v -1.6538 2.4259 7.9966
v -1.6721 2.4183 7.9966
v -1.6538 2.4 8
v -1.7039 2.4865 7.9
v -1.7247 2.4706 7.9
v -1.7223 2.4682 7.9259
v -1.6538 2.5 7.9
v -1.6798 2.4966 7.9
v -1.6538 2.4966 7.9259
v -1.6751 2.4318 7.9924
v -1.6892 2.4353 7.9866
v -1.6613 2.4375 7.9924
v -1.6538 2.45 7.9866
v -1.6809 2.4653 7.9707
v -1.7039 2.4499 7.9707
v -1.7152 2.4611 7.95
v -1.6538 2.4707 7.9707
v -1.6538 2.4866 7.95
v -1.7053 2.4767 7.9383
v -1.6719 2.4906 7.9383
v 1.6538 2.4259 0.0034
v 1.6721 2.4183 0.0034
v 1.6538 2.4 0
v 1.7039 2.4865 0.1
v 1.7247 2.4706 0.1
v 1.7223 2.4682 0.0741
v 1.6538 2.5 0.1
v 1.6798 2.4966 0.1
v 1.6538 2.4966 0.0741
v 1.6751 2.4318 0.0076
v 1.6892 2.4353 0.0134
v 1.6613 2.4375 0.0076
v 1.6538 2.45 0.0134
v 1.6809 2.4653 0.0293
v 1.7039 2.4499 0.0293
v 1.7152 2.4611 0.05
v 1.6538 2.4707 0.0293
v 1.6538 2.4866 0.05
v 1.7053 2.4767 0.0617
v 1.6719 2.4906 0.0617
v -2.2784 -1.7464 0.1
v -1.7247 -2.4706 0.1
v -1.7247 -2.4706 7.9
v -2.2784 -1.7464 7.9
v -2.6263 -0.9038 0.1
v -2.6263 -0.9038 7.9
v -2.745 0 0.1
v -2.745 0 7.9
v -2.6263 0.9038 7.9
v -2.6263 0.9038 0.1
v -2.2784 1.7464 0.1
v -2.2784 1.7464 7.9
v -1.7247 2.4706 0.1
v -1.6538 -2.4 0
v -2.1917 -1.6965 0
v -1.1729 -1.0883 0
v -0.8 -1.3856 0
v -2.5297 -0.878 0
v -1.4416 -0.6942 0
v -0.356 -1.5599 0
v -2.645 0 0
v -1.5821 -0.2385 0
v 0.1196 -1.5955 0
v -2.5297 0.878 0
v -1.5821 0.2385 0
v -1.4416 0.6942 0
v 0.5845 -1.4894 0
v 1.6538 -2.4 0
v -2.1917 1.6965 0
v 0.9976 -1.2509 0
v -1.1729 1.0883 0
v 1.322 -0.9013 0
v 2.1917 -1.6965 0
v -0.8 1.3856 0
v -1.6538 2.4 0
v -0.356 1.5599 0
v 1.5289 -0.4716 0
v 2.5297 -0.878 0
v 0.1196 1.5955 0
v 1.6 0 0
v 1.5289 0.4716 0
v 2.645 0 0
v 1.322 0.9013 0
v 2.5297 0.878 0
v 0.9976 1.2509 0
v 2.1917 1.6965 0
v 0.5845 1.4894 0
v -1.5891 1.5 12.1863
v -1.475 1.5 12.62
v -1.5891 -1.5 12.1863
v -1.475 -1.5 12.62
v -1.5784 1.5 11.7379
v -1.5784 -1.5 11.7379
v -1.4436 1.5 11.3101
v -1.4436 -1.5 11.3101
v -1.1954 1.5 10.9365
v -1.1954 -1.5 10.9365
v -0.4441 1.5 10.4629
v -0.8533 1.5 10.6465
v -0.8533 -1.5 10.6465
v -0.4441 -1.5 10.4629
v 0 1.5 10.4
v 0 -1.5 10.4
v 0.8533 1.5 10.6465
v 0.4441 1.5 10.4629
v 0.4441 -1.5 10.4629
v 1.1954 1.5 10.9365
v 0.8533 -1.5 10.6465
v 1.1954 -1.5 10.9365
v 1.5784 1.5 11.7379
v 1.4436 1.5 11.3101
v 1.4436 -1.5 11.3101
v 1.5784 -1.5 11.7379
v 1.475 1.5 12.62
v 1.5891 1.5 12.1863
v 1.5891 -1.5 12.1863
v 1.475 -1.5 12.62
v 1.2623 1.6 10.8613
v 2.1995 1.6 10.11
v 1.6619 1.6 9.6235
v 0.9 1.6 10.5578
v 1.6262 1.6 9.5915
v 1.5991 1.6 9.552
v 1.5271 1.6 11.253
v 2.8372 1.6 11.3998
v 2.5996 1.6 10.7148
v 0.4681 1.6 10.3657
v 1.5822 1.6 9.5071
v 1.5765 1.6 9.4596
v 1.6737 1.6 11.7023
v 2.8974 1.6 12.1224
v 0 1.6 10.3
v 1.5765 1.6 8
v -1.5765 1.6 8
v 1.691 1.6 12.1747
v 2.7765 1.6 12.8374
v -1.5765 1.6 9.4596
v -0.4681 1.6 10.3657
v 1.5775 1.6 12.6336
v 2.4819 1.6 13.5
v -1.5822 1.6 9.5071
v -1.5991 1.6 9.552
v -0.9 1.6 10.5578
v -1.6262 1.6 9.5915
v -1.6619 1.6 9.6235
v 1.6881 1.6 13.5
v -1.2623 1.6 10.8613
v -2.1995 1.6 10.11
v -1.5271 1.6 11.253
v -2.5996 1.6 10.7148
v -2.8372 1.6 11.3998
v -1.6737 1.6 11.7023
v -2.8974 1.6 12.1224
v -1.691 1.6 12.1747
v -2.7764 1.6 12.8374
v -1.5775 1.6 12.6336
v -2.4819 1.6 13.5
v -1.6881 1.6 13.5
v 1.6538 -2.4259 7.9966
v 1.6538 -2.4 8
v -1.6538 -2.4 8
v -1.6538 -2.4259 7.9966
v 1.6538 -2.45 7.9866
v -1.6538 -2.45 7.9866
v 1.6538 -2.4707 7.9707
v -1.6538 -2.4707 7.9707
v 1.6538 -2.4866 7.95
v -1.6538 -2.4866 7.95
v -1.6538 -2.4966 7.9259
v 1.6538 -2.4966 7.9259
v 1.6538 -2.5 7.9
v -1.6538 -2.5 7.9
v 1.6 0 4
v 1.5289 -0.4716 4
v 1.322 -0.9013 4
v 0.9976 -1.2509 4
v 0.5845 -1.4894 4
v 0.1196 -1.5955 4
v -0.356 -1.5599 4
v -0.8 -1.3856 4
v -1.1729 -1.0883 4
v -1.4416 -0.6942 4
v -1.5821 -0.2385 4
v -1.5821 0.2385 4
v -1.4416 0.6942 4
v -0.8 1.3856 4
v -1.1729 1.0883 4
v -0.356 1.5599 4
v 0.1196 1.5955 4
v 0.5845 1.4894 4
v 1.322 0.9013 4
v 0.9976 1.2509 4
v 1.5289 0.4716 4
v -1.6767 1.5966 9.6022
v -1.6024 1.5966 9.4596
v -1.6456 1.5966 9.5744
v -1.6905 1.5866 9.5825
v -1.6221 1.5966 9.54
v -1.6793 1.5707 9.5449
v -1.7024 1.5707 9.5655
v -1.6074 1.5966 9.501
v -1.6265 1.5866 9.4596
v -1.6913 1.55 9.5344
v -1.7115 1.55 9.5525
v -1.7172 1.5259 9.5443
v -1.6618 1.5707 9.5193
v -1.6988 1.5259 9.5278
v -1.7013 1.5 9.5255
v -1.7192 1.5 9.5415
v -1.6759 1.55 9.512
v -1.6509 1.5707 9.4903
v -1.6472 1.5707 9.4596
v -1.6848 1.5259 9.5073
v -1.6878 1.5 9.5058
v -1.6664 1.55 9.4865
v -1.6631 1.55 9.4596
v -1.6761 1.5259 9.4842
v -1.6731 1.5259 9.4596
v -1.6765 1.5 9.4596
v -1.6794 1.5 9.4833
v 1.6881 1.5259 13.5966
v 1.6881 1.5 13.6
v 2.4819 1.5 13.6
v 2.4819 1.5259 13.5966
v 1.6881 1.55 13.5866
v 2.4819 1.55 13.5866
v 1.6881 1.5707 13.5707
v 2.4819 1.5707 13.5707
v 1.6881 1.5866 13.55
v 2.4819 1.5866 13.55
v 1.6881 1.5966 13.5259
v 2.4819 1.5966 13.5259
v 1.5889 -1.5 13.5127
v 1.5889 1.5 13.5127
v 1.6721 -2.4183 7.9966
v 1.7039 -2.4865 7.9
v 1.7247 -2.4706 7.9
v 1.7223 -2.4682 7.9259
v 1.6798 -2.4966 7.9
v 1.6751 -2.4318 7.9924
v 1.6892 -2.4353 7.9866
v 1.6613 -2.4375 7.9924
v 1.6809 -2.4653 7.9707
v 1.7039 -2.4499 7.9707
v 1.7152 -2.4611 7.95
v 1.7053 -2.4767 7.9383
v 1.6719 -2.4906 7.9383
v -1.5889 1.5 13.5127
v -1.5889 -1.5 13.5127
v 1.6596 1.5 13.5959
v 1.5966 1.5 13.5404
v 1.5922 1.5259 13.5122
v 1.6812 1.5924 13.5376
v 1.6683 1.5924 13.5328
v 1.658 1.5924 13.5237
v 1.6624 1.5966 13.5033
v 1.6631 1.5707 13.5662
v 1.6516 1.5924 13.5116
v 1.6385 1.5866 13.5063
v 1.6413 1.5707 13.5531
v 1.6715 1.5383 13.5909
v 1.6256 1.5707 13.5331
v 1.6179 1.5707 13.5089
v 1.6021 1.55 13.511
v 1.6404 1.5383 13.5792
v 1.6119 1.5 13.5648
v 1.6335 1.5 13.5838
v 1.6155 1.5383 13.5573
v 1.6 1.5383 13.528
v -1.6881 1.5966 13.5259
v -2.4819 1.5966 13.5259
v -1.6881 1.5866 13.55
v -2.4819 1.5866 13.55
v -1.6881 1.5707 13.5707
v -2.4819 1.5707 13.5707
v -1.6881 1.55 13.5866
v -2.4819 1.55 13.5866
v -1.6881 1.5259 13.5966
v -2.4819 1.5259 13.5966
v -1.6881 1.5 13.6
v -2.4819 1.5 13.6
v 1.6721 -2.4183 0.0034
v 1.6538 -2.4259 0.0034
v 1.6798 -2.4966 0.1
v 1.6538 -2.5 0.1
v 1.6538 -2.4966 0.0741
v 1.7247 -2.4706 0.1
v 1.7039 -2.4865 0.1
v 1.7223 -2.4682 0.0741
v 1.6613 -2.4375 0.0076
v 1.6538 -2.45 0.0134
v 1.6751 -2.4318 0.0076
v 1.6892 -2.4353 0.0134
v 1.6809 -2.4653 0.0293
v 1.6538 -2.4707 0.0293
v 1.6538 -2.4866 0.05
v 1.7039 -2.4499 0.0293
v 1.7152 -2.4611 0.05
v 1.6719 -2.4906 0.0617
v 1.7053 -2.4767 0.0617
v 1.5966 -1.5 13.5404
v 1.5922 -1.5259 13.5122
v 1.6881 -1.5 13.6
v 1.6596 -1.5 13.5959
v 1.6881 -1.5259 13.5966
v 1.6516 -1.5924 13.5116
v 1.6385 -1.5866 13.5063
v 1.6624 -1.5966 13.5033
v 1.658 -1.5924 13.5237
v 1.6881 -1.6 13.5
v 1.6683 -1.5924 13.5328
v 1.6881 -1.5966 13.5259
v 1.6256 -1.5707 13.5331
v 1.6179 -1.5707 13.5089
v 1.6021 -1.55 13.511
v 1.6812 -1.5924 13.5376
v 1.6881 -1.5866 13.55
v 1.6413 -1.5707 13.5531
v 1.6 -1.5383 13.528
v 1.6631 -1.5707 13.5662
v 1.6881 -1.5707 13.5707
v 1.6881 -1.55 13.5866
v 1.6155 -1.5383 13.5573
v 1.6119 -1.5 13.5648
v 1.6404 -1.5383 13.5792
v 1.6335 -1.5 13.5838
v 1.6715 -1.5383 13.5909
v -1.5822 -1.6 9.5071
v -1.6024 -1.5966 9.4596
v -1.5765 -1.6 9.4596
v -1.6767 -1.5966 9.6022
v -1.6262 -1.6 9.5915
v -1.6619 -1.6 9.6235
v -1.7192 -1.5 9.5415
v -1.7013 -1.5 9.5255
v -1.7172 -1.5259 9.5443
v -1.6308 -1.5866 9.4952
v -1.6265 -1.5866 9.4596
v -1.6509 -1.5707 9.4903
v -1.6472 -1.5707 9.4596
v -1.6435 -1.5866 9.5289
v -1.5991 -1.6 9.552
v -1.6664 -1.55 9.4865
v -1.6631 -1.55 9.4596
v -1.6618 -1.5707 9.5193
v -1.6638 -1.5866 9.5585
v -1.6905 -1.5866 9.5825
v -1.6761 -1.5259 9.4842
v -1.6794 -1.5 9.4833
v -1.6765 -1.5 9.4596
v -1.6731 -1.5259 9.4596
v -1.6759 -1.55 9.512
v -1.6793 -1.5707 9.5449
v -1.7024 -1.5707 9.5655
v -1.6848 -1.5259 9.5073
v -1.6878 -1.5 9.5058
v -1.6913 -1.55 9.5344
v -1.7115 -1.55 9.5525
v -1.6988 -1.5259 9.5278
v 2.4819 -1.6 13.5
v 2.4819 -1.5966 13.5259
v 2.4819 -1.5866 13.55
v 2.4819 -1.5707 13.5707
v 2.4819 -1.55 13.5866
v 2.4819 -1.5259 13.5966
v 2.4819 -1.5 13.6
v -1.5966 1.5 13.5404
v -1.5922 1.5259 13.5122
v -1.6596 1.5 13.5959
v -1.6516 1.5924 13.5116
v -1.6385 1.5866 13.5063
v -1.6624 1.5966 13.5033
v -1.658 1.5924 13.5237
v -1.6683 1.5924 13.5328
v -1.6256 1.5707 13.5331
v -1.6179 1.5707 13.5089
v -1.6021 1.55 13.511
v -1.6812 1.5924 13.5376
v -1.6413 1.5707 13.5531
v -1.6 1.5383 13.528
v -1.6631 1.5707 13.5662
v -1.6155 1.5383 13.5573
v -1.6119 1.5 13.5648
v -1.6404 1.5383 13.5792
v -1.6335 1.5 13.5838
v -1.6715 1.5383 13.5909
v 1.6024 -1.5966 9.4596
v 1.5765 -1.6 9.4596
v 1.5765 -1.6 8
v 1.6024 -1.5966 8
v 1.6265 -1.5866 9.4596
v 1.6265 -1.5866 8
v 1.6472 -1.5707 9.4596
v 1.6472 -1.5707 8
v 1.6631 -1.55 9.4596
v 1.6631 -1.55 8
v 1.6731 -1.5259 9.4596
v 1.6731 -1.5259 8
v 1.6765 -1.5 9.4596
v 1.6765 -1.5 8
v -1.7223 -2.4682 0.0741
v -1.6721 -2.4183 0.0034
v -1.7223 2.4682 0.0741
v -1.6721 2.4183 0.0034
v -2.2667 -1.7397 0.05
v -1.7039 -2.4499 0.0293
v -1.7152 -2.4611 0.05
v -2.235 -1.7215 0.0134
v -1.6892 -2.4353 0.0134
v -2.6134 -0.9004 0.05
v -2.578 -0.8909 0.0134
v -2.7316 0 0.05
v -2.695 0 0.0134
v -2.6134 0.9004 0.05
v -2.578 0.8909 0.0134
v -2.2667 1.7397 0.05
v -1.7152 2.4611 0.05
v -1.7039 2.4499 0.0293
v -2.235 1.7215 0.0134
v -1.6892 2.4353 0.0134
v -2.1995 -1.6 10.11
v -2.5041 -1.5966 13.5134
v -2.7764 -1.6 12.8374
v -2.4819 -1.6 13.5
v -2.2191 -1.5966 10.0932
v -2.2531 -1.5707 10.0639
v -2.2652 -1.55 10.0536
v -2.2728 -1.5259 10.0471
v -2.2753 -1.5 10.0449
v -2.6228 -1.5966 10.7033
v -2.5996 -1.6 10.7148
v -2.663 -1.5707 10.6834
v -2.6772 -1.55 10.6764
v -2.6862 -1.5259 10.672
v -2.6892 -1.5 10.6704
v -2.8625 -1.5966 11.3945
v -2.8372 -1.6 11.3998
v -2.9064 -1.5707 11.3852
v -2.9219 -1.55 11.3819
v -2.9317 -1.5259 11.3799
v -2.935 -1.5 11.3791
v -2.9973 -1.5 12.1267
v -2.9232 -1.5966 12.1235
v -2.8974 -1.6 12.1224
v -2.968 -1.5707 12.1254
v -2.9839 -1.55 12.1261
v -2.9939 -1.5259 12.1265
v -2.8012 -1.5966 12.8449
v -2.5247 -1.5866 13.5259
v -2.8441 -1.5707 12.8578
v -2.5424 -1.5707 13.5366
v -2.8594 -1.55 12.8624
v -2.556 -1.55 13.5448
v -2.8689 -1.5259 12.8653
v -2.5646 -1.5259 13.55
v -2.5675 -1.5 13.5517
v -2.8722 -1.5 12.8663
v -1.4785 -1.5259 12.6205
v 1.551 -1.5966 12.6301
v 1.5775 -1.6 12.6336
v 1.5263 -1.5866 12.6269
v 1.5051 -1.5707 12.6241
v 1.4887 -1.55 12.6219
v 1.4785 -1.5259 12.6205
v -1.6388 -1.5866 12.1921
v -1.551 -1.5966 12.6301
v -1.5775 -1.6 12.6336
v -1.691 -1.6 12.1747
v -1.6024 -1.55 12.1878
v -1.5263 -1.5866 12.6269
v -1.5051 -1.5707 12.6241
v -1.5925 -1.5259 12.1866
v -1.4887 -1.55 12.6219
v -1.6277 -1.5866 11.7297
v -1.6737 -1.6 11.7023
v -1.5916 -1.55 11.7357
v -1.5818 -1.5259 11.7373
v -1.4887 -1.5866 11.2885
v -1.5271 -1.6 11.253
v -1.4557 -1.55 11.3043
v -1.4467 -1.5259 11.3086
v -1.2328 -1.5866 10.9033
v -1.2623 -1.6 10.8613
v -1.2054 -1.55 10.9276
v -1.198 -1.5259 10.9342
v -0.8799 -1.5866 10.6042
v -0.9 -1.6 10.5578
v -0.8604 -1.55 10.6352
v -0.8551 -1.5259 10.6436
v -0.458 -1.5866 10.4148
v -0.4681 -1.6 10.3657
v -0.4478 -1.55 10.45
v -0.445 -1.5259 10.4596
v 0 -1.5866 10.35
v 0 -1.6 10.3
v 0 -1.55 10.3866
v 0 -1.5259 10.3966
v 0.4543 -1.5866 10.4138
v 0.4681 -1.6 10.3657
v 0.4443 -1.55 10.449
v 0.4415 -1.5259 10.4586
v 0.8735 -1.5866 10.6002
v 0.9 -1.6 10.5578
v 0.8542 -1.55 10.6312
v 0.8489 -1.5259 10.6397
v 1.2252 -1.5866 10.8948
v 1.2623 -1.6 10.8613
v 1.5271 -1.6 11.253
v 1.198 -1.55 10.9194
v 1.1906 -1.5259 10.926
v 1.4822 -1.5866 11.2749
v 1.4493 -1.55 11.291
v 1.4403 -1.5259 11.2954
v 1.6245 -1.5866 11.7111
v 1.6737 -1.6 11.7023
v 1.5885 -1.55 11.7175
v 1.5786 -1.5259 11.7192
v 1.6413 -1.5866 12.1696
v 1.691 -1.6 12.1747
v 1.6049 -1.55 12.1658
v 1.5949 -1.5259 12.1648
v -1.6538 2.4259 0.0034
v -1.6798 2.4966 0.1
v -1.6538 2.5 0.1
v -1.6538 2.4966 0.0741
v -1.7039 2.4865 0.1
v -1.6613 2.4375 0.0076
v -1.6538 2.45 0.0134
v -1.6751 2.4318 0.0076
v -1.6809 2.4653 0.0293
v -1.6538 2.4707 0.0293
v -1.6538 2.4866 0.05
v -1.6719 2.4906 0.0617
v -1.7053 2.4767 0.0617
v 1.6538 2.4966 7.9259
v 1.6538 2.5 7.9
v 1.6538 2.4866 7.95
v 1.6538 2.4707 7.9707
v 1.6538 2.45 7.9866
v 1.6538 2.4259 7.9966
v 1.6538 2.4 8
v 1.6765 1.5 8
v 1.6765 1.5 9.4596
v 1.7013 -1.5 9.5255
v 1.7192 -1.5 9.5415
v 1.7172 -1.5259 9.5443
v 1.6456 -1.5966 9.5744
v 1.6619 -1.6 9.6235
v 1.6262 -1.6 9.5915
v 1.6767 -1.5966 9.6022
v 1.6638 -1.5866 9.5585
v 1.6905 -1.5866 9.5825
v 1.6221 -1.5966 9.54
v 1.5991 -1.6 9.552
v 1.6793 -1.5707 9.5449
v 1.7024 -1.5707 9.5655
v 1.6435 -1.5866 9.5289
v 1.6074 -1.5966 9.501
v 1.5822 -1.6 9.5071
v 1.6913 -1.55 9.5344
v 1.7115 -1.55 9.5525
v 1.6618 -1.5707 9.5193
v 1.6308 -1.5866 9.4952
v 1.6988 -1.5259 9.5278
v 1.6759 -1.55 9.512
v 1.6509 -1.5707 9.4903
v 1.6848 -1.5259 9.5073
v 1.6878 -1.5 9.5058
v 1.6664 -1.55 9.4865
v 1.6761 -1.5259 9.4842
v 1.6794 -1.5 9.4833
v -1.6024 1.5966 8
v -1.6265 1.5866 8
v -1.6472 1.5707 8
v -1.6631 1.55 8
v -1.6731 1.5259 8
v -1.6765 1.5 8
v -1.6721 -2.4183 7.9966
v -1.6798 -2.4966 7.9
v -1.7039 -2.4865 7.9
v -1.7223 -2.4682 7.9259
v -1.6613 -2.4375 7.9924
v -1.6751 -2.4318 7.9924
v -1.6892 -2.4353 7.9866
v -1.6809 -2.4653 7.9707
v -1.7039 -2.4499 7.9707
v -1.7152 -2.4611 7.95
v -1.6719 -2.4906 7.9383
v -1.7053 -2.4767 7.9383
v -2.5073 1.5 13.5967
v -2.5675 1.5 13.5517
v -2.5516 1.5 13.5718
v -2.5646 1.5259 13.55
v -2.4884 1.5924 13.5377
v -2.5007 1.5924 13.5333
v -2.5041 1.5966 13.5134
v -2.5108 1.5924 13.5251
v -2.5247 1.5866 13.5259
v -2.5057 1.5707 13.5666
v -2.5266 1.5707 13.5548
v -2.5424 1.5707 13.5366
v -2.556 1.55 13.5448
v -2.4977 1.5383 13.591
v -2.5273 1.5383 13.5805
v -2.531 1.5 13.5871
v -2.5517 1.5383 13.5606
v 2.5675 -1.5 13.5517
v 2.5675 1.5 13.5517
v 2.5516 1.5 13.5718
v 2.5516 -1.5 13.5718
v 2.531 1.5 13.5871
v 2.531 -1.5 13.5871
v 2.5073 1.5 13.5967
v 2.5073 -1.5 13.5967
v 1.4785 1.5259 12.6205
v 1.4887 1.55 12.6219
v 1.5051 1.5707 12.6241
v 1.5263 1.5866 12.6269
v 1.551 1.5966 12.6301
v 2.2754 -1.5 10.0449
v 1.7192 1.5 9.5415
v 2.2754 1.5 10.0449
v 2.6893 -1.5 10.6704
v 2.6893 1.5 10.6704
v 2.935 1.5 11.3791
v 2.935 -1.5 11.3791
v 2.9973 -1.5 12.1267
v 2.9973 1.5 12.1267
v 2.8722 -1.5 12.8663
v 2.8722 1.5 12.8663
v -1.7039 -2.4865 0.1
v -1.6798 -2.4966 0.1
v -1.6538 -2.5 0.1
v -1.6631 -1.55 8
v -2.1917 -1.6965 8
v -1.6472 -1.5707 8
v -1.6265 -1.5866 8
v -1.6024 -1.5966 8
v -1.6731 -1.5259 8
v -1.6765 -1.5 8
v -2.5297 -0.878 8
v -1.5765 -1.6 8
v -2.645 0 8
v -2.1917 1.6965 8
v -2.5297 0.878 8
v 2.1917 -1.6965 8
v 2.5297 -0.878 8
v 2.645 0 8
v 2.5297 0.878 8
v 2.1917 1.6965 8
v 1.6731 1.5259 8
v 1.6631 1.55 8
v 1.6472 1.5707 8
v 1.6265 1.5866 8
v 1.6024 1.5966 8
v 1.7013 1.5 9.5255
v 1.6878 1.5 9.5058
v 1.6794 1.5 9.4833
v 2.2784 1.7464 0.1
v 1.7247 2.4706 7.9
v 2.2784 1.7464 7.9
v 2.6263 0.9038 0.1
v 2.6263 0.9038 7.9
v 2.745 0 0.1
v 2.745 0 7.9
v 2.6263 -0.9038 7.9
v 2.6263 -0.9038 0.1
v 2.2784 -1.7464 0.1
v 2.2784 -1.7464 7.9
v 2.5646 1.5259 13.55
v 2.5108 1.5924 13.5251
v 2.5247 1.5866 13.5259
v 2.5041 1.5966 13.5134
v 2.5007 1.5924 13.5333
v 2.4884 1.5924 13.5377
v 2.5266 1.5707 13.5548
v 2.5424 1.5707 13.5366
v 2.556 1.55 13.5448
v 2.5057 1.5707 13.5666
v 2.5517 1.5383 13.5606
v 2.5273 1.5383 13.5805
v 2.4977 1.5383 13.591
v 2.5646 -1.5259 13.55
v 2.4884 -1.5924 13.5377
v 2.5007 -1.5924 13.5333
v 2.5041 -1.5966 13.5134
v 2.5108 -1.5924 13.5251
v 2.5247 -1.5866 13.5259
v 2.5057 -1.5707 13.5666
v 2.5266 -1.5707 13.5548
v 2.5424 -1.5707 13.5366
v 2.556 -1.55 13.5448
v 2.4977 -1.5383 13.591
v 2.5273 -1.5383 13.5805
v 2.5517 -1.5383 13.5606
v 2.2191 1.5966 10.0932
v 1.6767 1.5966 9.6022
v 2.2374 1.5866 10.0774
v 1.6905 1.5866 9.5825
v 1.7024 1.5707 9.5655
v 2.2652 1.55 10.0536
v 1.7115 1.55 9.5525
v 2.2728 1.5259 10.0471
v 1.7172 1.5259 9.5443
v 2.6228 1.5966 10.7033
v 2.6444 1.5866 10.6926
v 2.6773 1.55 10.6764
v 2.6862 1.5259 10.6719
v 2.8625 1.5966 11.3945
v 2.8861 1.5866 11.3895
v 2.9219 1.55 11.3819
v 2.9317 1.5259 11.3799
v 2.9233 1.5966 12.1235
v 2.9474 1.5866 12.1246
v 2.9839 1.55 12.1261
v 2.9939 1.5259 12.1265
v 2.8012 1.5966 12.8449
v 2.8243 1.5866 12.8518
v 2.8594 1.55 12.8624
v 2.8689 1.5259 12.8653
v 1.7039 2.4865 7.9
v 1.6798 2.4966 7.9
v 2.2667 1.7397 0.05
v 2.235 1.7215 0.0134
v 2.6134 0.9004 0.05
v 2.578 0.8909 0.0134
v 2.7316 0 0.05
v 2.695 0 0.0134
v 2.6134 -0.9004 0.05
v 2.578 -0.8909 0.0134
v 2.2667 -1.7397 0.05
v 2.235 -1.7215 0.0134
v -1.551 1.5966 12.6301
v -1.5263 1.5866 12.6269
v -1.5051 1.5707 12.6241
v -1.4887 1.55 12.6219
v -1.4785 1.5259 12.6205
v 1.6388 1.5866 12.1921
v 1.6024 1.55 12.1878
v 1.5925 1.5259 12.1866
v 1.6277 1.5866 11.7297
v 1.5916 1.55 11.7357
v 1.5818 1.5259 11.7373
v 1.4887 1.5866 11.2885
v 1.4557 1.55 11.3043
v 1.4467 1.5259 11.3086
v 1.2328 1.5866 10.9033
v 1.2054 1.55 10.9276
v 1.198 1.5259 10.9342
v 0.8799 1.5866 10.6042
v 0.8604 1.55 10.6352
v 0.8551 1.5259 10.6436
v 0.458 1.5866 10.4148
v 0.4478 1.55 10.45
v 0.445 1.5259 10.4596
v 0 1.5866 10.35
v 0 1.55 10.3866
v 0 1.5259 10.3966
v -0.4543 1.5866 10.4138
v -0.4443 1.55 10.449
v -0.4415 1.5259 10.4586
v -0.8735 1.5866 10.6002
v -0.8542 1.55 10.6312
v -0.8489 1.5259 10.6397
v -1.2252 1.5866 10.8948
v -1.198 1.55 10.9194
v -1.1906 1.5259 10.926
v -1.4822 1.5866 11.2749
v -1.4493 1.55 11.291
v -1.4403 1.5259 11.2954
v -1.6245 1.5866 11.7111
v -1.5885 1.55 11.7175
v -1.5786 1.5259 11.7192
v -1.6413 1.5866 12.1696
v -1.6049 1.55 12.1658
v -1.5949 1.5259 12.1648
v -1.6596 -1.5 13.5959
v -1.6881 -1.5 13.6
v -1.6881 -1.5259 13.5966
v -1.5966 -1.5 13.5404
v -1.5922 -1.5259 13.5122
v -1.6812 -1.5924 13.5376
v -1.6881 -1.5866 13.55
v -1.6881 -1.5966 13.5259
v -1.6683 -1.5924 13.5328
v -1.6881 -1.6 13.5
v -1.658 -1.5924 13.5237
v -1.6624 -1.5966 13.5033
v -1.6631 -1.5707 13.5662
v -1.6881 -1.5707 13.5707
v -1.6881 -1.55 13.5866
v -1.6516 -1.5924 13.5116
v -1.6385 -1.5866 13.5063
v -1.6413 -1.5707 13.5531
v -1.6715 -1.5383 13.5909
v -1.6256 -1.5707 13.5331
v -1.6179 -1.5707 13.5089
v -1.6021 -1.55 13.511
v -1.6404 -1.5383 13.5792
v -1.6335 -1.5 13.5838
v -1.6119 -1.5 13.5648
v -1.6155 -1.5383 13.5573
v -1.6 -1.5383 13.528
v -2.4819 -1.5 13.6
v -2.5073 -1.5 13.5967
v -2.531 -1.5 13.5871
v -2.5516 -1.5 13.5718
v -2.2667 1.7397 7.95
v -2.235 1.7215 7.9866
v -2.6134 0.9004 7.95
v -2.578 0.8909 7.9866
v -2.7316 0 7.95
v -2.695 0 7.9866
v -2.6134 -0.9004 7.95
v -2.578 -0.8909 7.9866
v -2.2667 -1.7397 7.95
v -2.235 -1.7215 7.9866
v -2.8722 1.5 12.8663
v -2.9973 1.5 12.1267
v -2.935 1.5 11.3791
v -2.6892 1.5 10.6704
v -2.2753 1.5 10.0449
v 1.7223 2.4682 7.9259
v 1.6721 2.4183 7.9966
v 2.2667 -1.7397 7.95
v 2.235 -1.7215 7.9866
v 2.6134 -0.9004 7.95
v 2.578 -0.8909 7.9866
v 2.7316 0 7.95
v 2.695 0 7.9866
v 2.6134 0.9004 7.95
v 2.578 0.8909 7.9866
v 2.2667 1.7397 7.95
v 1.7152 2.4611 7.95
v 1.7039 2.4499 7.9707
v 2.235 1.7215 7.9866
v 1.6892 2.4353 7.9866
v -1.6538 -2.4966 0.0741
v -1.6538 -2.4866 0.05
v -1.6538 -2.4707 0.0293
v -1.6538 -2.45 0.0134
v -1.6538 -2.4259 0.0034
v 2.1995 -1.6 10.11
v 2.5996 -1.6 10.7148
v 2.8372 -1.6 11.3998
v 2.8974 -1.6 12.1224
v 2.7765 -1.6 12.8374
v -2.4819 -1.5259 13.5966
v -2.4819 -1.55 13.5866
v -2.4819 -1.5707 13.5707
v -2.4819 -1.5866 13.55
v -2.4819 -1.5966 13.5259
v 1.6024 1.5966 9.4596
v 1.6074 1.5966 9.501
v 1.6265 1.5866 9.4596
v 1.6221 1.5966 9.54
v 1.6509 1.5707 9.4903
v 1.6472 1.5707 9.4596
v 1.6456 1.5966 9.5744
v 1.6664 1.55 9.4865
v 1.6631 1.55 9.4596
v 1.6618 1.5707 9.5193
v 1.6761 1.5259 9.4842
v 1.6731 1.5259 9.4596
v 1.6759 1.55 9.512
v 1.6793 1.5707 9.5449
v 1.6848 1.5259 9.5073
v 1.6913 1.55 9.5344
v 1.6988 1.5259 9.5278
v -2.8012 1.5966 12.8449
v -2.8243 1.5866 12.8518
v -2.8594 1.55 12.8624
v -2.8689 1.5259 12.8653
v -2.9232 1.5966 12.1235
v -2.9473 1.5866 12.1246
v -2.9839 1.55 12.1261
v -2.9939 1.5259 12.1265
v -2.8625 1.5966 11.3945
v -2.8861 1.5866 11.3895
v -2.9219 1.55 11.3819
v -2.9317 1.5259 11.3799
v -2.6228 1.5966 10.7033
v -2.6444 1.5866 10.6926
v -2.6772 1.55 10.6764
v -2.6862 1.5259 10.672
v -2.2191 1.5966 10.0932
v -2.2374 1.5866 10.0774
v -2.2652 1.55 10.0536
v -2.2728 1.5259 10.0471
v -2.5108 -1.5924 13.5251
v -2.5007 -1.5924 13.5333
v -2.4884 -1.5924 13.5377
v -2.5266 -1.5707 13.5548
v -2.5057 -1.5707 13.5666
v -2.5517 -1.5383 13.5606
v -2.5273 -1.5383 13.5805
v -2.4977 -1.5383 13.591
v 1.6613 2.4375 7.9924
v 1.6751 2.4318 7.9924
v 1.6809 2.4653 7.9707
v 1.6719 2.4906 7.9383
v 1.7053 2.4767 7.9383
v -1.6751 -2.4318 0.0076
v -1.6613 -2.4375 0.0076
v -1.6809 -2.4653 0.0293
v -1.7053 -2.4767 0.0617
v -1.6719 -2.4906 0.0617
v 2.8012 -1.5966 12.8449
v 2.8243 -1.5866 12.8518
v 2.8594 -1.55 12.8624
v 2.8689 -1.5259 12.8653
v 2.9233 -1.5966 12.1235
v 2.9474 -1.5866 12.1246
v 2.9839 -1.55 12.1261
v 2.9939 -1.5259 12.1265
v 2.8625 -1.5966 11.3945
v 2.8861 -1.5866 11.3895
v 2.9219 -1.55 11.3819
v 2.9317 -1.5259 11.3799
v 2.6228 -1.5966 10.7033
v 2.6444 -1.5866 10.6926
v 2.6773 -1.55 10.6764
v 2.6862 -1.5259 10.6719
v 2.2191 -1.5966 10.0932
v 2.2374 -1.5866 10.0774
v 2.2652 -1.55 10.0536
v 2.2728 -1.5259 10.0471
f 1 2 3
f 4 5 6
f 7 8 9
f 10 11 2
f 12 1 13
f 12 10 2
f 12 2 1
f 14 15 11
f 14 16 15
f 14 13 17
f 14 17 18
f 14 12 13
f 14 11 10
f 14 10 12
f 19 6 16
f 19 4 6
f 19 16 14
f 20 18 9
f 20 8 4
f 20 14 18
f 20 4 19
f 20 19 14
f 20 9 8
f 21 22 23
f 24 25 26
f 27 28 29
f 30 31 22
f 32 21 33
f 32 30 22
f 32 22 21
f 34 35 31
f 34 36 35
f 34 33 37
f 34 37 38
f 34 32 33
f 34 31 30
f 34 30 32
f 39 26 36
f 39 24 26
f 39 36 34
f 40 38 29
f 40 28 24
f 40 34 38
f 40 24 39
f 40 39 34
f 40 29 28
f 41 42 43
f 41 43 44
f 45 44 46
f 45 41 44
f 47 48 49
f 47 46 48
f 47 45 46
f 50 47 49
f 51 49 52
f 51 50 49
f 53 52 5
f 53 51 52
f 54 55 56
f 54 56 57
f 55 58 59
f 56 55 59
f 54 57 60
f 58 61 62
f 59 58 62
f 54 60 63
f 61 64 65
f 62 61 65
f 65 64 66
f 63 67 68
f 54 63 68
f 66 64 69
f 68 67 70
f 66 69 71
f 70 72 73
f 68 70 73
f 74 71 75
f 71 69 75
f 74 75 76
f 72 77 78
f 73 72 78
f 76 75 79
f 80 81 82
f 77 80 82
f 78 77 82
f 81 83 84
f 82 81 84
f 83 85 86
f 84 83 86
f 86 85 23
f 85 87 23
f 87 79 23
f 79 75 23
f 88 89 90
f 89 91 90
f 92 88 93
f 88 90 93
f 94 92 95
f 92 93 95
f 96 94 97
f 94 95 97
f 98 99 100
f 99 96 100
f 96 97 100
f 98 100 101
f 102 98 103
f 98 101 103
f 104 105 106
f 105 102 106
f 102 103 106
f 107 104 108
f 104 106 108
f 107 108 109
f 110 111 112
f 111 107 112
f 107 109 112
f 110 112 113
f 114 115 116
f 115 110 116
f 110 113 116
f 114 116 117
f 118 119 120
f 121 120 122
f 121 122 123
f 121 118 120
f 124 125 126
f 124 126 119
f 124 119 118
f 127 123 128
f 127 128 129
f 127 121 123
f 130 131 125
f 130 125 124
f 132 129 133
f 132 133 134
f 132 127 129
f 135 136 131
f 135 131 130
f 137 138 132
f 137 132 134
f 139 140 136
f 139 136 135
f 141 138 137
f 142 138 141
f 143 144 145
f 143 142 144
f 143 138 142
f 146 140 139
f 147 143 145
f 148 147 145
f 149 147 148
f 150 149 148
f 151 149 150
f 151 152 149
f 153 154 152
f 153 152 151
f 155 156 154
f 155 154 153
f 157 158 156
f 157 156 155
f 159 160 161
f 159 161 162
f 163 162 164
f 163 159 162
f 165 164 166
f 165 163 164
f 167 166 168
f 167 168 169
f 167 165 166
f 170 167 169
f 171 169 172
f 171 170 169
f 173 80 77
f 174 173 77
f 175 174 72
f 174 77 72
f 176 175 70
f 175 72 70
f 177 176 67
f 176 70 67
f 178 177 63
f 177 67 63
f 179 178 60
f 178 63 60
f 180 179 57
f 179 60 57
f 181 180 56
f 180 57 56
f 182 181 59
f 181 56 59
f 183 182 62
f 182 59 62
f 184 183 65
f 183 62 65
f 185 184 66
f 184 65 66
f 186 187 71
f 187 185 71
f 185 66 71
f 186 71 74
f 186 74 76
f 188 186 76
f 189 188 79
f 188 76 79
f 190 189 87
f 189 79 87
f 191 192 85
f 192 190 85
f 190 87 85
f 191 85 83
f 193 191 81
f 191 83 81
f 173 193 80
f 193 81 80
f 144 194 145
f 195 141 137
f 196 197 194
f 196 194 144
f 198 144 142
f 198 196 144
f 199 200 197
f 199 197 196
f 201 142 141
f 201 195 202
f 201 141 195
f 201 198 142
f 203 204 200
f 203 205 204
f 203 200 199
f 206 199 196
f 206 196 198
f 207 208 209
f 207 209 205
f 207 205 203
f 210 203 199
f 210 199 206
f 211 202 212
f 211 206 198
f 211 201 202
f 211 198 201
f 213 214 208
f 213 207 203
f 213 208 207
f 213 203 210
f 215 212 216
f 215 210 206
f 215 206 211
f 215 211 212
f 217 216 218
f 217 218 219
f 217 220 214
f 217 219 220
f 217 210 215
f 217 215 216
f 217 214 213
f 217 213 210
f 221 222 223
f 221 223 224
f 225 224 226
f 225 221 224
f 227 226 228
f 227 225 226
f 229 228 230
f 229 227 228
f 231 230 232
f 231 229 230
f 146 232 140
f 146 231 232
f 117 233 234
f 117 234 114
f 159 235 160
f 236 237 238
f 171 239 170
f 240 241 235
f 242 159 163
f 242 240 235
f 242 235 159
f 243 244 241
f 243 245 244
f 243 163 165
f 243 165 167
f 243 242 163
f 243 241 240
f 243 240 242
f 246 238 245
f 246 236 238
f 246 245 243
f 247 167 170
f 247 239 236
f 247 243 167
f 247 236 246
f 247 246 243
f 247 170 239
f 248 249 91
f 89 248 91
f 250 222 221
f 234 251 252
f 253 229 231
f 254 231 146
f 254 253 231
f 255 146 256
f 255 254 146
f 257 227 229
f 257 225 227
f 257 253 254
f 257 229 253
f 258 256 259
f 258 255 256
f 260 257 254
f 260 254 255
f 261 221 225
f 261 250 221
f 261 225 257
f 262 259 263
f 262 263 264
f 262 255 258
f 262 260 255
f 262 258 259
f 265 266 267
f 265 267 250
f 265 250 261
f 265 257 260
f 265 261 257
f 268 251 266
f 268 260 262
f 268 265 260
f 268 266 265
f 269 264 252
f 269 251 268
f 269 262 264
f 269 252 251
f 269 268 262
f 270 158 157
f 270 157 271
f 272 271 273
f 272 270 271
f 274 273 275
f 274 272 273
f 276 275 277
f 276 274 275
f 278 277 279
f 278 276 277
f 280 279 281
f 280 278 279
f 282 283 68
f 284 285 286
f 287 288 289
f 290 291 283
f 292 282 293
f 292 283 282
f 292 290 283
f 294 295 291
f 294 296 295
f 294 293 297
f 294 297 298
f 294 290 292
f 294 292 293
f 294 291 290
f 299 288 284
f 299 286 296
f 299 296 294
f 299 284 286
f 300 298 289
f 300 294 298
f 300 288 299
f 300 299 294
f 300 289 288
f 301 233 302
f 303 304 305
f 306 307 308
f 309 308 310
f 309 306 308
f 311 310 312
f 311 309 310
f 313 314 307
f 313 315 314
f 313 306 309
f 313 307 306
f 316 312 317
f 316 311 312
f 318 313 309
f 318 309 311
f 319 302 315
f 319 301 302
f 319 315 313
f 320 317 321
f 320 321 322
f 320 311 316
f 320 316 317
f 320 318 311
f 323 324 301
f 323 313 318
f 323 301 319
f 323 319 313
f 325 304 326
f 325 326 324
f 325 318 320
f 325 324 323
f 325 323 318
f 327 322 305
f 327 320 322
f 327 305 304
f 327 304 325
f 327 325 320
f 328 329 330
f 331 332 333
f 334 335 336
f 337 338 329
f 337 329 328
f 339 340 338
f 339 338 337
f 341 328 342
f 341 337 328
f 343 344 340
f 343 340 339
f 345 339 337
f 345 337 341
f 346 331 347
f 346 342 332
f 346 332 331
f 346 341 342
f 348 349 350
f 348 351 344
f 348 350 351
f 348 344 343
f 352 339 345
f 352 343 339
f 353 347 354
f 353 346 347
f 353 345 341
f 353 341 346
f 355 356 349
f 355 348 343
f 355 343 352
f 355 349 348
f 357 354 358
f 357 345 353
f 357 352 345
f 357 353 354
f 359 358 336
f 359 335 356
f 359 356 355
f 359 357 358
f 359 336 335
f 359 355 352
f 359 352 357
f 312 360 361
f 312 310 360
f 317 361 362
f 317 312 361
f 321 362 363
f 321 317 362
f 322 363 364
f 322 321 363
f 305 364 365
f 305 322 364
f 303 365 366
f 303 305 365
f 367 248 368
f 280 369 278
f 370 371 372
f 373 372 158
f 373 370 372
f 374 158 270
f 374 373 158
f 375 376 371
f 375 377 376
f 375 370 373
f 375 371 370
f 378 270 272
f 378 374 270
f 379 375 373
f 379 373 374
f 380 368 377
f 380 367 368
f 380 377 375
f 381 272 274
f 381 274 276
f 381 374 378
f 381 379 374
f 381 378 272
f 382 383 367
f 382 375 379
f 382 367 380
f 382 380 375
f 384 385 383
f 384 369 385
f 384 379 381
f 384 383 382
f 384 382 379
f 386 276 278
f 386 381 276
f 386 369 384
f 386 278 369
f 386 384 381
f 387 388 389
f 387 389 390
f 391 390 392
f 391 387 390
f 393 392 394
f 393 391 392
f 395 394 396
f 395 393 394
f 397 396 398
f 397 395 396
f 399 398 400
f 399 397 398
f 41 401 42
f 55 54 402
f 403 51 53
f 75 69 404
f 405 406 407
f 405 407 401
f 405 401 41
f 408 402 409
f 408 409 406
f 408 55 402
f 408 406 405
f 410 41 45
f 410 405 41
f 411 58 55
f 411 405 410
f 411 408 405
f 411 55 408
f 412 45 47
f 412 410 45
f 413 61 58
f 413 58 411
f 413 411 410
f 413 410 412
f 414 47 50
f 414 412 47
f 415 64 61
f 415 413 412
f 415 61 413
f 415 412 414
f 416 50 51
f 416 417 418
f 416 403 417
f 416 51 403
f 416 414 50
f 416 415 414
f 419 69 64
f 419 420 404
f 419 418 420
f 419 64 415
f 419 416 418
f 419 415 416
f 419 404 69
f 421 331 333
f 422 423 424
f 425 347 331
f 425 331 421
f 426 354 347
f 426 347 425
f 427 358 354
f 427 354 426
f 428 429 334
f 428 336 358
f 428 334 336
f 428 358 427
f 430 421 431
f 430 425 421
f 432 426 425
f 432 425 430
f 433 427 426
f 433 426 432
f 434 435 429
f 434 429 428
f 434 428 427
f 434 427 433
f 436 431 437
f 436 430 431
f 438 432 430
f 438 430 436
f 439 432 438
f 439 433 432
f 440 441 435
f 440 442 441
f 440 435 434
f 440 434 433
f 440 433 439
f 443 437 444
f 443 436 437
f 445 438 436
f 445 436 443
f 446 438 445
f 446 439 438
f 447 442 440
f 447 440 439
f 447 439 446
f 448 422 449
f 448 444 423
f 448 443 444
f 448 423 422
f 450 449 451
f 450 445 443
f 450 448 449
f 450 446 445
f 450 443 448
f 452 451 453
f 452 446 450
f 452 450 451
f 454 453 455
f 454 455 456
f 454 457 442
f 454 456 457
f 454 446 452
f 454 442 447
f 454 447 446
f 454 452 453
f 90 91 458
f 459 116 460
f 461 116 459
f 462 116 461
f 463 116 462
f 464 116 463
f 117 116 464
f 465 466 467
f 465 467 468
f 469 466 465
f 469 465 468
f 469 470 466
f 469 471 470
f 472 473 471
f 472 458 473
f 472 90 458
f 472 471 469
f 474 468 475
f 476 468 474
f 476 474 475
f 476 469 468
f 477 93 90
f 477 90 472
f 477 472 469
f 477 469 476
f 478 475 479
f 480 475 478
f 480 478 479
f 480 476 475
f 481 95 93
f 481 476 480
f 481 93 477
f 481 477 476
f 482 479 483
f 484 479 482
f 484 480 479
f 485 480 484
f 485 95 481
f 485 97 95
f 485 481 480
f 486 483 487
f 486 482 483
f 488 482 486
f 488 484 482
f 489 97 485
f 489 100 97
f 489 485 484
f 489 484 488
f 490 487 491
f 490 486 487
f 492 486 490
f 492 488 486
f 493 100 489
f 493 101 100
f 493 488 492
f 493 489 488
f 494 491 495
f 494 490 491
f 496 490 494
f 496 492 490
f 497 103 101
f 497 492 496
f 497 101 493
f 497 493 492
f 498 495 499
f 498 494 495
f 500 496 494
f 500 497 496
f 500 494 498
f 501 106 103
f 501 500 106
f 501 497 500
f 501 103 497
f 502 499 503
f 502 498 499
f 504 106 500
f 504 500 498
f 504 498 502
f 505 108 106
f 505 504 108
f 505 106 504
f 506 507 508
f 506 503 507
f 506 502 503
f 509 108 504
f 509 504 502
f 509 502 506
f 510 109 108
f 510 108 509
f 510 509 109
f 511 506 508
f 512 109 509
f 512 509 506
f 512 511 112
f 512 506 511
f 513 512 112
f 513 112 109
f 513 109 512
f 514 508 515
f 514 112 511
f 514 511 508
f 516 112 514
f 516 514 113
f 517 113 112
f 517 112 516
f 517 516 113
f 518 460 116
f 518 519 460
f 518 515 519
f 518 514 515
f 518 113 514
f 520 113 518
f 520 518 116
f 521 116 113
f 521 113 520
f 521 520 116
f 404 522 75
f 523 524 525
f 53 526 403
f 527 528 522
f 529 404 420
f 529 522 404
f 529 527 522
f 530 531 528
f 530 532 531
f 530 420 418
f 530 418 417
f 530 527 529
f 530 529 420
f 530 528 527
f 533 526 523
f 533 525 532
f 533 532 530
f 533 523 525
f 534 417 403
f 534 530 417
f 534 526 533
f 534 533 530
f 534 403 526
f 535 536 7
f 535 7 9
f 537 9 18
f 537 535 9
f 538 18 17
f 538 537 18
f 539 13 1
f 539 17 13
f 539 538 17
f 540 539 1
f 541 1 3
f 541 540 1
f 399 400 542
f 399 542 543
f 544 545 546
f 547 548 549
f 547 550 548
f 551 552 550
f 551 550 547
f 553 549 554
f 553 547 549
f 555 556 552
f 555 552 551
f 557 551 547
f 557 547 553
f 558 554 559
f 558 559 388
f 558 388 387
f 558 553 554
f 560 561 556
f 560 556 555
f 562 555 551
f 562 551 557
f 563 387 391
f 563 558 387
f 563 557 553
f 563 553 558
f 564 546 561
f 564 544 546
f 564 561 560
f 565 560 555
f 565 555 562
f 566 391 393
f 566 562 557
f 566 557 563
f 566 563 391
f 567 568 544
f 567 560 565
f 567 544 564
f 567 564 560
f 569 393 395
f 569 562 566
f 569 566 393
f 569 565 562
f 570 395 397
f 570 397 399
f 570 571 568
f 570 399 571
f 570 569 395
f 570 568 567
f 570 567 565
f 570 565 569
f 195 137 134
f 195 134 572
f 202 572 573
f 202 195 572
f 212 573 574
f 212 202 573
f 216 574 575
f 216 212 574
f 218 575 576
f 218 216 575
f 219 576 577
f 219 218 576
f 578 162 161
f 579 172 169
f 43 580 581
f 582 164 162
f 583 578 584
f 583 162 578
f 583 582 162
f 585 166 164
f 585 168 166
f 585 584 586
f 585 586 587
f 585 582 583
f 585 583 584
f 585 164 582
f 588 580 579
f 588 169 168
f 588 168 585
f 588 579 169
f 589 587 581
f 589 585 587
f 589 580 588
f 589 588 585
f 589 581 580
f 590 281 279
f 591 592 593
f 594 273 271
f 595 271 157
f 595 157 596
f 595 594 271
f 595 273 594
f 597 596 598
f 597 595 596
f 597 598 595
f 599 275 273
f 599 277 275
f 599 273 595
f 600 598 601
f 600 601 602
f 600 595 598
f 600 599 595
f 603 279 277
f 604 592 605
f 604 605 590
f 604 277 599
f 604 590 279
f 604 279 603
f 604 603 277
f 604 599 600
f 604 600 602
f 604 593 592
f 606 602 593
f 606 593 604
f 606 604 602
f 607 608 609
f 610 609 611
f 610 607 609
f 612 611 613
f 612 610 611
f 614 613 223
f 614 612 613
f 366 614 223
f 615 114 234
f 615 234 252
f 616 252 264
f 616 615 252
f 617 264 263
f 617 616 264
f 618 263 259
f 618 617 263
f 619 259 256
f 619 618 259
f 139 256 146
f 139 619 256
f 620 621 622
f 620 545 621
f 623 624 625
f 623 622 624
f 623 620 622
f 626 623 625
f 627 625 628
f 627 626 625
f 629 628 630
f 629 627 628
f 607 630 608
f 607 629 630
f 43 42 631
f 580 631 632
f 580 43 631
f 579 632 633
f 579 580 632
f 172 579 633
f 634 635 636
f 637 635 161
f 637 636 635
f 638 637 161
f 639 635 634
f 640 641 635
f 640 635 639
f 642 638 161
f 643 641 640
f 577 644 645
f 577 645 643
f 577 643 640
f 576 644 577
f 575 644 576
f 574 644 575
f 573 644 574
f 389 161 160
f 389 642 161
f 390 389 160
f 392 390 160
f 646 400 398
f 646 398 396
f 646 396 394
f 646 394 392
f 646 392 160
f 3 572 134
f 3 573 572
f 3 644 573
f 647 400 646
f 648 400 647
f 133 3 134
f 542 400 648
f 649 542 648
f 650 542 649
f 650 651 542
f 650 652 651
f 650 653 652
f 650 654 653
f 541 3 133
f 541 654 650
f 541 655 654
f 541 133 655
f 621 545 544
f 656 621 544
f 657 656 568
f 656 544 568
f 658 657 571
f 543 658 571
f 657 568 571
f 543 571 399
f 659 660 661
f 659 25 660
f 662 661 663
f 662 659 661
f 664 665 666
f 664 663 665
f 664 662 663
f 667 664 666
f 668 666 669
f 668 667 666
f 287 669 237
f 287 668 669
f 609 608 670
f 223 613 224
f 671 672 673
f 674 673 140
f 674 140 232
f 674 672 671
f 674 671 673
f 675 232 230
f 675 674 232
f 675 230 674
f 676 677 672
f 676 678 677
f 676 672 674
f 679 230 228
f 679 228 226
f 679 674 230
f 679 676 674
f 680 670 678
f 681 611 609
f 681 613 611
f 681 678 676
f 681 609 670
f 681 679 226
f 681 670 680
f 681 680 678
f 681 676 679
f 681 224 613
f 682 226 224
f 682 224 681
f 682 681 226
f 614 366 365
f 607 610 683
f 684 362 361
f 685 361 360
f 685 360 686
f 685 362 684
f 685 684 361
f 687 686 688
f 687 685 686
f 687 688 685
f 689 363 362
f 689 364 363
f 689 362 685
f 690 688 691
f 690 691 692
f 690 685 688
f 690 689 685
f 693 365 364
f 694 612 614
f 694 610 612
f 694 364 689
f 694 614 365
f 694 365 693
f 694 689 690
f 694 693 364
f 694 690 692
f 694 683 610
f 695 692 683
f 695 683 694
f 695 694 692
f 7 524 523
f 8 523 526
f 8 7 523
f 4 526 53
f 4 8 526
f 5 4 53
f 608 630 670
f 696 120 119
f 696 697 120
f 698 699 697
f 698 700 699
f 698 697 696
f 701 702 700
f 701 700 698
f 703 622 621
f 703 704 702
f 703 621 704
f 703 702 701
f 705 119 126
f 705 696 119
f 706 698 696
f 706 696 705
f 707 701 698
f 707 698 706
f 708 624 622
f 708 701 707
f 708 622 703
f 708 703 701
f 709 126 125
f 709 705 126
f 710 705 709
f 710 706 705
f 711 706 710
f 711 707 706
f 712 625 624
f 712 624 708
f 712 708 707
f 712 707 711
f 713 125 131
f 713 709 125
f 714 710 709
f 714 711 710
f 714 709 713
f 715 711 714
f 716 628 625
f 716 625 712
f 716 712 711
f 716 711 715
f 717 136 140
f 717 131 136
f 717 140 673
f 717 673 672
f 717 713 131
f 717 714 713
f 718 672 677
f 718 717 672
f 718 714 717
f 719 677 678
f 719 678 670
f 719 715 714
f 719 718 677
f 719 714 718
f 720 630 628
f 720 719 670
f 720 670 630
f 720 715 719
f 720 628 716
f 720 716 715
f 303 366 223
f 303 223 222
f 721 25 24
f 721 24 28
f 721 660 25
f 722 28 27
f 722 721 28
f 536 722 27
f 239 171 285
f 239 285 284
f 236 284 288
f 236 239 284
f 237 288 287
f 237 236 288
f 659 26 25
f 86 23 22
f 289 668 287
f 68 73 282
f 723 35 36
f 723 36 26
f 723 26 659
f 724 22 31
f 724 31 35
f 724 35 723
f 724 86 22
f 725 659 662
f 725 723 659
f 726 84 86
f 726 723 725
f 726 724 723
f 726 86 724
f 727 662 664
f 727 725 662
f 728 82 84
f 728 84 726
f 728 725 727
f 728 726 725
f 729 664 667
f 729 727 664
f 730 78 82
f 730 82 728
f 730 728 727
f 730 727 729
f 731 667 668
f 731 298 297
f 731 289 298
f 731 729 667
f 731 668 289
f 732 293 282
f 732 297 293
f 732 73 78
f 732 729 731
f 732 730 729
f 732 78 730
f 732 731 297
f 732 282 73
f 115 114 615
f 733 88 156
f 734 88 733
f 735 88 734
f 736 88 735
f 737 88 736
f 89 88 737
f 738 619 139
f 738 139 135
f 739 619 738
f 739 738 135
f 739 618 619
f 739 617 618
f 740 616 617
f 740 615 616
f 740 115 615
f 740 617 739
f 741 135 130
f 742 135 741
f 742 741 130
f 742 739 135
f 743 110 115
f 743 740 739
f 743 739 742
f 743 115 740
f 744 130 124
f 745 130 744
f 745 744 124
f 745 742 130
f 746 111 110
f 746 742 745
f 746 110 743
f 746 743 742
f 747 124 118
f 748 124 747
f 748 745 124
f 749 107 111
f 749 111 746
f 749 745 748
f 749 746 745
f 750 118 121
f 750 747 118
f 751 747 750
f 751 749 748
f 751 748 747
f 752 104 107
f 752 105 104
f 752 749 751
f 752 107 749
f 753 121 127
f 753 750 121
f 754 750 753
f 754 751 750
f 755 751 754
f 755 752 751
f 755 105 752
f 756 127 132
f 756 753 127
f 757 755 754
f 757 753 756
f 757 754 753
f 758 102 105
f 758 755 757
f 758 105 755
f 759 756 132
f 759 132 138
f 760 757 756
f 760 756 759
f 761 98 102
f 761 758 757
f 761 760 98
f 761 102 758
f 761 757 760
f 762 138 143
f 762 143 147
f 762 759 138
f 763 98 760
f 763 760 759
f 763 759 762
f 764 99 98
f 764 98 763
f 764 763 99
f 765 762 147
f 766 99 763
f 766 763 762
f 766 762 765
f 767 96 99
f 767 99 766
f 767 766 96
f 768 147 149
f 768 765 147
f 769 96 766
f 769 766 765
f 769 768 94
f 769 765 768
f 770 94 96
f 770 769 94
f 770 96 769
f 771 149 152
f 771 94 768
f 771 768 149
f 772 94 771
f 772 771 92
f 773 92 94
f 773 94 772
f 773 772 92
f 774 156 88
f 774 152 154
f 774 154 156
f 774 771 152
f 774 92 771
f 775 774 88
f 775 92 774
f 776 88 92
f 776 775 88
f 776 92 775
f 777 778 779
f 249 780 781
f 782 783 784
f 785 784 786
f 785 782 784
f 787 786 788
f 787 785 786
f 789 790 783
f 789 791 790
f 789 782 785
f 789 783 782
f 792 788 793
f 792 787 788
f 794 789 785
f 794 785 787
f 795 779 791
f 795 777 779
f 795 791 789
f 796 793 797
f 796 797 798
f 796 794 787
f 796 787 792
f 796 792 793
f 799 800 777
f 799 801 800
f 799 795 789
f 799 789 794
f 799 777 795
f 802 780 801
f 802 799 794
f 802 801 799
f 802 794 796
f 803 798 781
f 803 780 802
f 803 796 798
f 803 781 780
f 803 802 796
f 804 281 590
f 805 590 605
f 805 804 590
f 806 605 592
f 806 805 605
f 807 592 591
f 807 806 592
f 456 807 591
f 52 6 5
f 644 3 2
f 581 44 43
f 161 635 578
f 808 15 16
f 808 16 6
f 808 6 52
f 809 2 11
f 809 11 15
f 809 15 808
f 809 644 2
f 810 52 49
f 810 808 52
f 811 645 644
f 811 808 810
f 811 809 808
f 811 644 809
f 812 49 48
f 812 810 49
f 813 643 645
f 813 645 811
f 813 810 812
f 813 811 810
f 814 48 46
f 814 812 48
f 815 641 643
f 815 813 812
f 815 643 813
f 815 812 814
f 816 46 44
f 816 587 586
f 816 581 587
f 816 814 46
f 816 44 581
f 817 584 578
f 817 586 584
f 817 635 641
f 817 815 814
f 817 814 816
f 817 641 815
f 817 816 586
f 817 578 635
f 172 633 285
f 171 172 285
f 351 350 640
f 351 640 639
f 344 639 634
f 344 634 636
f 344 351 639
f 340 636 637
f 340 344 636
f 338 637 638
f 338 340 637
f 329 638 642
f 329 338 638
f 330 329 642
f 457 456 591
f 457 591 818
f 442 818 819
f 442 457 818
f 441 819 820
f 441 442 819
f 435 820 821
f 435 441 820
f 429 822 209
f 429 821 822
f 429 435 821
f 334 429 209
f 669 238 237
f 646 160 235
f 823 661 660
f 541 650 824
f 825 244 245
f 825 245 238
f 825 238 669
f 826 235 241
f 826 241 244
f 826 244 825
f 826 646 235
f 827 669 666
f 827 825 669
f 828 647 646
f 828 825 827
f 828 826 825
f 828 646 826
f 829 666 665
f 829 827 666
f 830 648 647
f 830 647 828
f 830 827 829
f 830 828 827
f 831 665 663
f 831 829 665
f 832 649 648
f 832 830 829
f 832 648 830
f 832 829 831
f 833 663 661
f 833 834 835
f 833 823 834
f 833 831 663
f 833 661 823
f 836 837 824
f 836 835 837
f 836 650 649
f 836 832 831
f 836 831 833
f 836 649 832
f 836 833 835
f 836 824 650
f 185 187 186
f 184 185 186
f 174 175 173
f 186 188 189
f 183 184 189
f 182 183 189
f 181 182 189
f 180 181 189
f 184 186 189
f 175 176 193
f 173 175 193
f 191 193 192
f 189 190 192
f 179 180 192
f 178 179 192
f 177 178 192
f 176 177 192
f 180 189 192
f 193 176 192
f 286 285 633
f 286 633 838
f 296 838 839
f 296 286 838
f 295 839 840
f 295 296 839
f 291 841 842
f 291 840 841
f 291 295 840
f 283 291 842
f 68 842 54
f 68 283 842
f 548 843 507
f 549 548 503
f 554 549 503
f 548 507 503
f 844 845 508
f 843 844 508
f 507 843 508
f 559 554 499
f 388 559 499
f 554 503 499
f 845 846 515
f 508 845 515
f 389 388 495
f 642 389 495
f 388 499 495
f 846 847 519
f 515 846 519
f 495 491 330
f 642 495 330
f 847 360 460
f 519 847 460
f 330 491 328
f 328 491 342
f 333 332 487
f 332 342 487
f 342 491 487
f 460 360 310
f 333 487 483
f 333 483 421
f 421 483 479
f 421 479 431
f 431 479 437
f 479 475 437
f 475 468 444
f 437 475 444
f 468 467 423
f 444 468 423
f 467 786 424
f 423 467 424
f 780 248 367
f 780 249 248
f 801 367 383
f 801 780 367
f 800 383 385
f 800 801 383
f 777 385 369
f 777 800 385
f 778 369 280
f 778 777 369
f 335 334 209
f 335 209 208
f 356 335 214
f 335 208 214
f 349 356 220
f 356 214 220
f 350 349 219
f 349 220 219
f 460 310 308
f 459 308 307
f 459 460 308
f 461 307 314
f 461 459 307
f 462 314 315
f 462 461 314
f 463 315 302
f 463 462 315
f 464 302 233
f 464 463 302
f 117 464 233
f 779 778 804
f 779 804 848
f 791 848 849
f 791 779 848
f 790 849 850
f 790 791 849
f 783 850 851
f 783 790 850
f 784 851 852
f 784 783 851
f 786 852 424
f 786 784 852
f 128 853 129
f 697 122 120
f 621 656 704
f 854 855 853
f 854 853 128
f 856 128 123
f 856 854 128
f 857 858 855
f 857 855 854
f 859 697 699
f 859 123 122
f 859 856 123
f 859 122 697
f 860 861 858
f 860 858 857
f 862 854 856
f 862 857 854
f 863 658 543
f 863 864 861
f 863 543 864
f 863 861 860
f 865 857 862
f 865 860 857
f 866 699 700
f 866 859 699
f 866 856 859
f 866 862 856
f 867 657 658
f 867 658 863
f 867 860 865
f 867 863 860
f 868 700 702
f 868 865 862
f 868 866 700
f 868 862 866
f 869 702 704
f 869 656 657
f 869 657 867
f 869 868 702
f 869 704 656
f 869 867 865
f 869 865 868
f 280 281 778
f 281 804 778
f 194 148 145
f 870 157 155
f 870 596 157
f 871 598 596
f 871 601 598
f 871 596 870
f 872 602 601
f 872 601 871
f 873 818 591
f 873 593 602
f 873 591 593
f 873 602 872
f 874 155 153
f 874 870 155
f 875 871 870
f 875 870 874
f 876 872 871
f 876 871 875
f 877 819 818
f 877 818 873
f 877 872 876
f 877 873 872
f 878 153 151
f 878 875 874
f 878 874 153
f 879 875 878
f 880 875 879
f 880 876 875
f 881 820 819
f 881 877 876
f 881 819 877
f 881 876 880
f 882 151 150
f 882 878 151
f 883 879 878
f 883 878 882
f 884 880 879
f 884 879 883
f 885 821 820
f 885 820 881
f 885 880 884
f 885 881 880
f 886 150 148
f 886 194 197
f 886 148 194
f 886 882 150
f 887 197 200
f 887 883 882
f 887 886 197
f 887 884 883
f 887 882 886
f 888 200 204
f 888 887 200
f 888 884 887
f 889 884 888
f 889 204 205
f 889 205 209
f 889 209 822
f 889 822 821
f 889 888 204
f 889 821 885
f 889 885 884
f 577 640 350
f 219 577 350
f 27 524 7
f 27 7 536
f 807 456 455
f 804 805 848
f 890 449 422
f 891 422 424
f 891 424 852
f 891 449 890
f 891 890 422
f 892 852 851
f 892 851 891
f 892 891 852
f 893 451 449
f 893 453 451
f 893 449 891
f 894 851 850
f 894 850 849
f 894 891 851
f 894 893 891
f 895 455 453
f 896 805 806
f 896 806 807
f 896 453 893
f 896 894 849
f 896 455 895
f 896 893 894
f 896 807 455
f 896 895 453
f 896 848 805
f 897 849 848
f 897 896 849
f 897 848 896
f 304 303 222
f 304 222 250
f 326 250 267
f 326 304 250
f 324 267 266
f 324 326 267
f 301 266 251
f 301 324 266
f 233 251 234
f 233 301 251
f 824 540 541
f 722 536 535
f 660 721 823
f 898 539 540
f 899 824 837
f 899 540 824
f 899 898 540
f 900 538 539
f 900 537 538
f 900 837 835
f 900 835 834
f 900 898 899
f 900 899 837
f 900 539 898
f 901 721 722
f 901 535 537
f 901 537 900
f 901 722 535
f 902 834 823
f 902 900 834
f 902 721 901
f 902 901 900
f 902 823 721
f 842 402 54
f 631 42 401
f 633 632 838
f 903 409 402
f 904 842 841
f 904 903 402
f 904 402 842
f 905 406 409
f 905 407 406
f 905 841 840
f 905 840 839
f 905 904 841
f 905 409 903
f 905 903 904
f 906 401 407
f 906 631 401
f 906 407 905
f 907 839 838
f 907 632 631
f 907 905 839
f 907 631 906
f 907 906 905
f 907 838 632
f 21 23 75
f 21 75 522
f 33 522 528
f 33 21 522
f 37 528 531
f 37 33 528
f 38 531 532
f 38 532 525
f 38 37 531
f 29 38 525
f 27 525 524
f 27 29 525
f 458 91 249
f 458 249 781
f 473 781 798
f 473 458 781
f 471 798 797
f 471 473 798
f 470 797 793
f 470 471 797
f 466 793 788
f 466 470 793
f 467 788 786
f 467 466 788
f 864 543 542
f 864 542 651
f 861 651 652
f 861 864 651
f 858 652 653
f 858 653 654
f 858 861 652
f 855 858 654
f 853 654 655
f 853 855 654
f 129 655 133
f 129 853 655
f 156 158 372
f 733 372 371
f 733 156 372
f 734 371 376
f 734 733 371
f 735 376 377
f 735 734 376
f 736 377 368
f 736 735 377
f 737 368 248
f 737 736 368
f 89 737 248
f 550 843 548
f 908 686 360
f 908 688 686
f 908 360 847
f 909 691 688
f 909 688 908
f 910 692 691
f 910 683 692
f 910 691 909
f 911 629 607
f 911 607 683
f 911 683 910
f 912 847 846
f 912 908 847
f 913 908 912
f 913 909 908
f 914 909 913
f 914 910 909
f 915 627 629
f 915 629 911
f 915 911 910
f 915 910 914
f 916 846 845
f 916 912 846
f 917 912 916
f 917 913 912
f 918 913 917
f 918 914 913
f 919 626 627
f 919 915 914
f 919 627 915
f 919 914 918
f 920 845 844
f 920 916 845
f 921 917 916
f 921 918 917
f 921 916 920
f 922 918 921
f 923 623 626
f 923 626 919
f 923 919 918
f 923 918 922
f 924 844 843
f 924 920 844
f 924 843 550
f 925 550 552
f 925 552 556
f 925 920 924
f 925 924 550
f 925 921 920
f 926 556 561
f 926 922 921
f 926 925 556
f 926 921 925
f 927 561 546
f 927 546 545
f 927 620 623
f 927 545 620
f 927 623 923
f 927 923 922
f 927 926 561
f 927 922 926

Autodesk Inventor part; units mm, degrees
ref_plane "YZ Plane" through (0, 0, 0) normal (1, 0, 0) x (0, 1, 0)
ref_plane "XZ Plane" through (0, 0, 0) normal (0, 1, 0) x (-1, 0, 0)
ref_plane "XY Plane" through (0, 0, 0) normal (0, 0, 1) x (1, 0, 0)
sketch "Sketch2" plane through (0, 0, 0) normal (0, 0, 1) x (1, 0, 0)
  line L0 (-1.695, 2.5) -> (1.695, 2.5)
  line L1 (-1.695, -2.5) -> (1.695, -2.5)
  arc A0 (1.695, -2.5) -> (1.695, 2.5) centre (-0.7562, 0) ccw
  arc A1 (-1.695, 2.5) -> (-1.695, -2.5) centre (0.7562, 0) ccw
  circle A2 centre (0, 0) radius 1.6
  line L2 (-0.7562, 0) -> (0.7562, 0) construction
  dimension "d0" = 5
  dimension "d2" = 3.2
  dimension "d7" = 3.39
  dimension "d9" = 5.49
extrude "Extrusion1" add sketch "Sketch2" along normal blind 8 contours L0 A0 L1 A1 | A2
extrude "Extrusion2" cut sketch "Sketch2" along normal blind 4 contours A2
sketch "Sketch3" plane through (0, 0, 0) normal (0, 1, 0) x (-1, 0, 0)
  line L0 (-1.695, 8) -> (1.695, 8) construction
  line L1 (-1.6765, 8) -> (1.6765, 8)
  line L2 (1.6765, 8) -> (1.6765, 9.5122)
  line L3 (-1.6765, 8) -> (-1.6765, 9.5122)
  arc A0 (-2.5377, 13.6) -> (-1.6765, 9.5122) centre (0, 12) ccw
  arc A1 (1.6765, 9.5122) -> (2.5377, 13.6) centre (0, 12) ccw
  line L4 (-2.5377, 13.6) -> (-1.6, 13.6)
  line L5 (-1.6, 13.6) -> (-1.475, 12.62)
  line L6 (2.5377, 13.6) -> (1.6, 13.6)
  line L7 (1.6, 13.6) -> (1.475, 12.62)
  arc A2 (-1.475, 12.62) -> (1.475, 12.62) centre (0, 12) ccw
  point P0 (0, 0)
  point P1 (0, 8)
  dimension "d10" = 3.2
  dimension "d11" = 2.95
  dimension "d12" = 3.2
  dimension "d13" = 5.6
  dimension "d14" = 4
  dimension "d16" = 3.353
  dimension "d17" = 6
extrude "Extrusion3" add sketch "Sketch3" along normal mid plane 3.2
fillet "Fillet1" radius 0.1 36 edges at (-1.5375, 1.6, 13.11) (-2.0689, 1.6, 13.6) (-2.5377, 0, 13.6) (-1.6, 0, 13.6) (-2.0689, -1.6, 13.6) (-2.9356, 1.6, 11.3815) (-2.9356, -1.6, 11.3815) (0, 1.6, 10.4) (0, -1.6, 10.4) (-1.5375, -1.6, 13.11) (1.5375, -1.6, 13.11) (1.6, 0, 13.6) (1.5375, 1.6, 13.11) (2.0689, 1.6, 13.6) (2.5377, 0, 13.6) (2.9356, 1.6, 11.3815) (2.0689, -1.6, 13.6) (2.9356, -1.6, 11.3815) (1.6765, 1.6, 8.7561) (-1.6765, 1.6, 8.7561) (-1.695, 2.5, 4) (1.6765, -1.6, 8.7561) (2.745, 0, 8) (0, 2.5, 8) (-2.745, 0, 8) (1.695, 2.5, 4) (0, -2.5, 8) (-1.6765, -1.6, 8.7561) (-1.695, -2.5, 4) (1.695, -2.5, 4) (0, -2.5, 0) (-2.745, 0, 0) (2.745, 0, 0) (0, 2.5, 0) (1.6765, 0, 9.5122) (-1.6765, 0, 9.5122)
equation "\"d2\" = rd"
equation "\"d3\" = lu"
equation "\"d5\" = 0.5 * lu"
equation "\"d10\" = rd"
equation "\"d12\" = rd"
equation "\"rd\" = 3.2"
equation "\"lu\" = 8"
properties part number "44873-LtBluishGray" material "ABS Plastic"
